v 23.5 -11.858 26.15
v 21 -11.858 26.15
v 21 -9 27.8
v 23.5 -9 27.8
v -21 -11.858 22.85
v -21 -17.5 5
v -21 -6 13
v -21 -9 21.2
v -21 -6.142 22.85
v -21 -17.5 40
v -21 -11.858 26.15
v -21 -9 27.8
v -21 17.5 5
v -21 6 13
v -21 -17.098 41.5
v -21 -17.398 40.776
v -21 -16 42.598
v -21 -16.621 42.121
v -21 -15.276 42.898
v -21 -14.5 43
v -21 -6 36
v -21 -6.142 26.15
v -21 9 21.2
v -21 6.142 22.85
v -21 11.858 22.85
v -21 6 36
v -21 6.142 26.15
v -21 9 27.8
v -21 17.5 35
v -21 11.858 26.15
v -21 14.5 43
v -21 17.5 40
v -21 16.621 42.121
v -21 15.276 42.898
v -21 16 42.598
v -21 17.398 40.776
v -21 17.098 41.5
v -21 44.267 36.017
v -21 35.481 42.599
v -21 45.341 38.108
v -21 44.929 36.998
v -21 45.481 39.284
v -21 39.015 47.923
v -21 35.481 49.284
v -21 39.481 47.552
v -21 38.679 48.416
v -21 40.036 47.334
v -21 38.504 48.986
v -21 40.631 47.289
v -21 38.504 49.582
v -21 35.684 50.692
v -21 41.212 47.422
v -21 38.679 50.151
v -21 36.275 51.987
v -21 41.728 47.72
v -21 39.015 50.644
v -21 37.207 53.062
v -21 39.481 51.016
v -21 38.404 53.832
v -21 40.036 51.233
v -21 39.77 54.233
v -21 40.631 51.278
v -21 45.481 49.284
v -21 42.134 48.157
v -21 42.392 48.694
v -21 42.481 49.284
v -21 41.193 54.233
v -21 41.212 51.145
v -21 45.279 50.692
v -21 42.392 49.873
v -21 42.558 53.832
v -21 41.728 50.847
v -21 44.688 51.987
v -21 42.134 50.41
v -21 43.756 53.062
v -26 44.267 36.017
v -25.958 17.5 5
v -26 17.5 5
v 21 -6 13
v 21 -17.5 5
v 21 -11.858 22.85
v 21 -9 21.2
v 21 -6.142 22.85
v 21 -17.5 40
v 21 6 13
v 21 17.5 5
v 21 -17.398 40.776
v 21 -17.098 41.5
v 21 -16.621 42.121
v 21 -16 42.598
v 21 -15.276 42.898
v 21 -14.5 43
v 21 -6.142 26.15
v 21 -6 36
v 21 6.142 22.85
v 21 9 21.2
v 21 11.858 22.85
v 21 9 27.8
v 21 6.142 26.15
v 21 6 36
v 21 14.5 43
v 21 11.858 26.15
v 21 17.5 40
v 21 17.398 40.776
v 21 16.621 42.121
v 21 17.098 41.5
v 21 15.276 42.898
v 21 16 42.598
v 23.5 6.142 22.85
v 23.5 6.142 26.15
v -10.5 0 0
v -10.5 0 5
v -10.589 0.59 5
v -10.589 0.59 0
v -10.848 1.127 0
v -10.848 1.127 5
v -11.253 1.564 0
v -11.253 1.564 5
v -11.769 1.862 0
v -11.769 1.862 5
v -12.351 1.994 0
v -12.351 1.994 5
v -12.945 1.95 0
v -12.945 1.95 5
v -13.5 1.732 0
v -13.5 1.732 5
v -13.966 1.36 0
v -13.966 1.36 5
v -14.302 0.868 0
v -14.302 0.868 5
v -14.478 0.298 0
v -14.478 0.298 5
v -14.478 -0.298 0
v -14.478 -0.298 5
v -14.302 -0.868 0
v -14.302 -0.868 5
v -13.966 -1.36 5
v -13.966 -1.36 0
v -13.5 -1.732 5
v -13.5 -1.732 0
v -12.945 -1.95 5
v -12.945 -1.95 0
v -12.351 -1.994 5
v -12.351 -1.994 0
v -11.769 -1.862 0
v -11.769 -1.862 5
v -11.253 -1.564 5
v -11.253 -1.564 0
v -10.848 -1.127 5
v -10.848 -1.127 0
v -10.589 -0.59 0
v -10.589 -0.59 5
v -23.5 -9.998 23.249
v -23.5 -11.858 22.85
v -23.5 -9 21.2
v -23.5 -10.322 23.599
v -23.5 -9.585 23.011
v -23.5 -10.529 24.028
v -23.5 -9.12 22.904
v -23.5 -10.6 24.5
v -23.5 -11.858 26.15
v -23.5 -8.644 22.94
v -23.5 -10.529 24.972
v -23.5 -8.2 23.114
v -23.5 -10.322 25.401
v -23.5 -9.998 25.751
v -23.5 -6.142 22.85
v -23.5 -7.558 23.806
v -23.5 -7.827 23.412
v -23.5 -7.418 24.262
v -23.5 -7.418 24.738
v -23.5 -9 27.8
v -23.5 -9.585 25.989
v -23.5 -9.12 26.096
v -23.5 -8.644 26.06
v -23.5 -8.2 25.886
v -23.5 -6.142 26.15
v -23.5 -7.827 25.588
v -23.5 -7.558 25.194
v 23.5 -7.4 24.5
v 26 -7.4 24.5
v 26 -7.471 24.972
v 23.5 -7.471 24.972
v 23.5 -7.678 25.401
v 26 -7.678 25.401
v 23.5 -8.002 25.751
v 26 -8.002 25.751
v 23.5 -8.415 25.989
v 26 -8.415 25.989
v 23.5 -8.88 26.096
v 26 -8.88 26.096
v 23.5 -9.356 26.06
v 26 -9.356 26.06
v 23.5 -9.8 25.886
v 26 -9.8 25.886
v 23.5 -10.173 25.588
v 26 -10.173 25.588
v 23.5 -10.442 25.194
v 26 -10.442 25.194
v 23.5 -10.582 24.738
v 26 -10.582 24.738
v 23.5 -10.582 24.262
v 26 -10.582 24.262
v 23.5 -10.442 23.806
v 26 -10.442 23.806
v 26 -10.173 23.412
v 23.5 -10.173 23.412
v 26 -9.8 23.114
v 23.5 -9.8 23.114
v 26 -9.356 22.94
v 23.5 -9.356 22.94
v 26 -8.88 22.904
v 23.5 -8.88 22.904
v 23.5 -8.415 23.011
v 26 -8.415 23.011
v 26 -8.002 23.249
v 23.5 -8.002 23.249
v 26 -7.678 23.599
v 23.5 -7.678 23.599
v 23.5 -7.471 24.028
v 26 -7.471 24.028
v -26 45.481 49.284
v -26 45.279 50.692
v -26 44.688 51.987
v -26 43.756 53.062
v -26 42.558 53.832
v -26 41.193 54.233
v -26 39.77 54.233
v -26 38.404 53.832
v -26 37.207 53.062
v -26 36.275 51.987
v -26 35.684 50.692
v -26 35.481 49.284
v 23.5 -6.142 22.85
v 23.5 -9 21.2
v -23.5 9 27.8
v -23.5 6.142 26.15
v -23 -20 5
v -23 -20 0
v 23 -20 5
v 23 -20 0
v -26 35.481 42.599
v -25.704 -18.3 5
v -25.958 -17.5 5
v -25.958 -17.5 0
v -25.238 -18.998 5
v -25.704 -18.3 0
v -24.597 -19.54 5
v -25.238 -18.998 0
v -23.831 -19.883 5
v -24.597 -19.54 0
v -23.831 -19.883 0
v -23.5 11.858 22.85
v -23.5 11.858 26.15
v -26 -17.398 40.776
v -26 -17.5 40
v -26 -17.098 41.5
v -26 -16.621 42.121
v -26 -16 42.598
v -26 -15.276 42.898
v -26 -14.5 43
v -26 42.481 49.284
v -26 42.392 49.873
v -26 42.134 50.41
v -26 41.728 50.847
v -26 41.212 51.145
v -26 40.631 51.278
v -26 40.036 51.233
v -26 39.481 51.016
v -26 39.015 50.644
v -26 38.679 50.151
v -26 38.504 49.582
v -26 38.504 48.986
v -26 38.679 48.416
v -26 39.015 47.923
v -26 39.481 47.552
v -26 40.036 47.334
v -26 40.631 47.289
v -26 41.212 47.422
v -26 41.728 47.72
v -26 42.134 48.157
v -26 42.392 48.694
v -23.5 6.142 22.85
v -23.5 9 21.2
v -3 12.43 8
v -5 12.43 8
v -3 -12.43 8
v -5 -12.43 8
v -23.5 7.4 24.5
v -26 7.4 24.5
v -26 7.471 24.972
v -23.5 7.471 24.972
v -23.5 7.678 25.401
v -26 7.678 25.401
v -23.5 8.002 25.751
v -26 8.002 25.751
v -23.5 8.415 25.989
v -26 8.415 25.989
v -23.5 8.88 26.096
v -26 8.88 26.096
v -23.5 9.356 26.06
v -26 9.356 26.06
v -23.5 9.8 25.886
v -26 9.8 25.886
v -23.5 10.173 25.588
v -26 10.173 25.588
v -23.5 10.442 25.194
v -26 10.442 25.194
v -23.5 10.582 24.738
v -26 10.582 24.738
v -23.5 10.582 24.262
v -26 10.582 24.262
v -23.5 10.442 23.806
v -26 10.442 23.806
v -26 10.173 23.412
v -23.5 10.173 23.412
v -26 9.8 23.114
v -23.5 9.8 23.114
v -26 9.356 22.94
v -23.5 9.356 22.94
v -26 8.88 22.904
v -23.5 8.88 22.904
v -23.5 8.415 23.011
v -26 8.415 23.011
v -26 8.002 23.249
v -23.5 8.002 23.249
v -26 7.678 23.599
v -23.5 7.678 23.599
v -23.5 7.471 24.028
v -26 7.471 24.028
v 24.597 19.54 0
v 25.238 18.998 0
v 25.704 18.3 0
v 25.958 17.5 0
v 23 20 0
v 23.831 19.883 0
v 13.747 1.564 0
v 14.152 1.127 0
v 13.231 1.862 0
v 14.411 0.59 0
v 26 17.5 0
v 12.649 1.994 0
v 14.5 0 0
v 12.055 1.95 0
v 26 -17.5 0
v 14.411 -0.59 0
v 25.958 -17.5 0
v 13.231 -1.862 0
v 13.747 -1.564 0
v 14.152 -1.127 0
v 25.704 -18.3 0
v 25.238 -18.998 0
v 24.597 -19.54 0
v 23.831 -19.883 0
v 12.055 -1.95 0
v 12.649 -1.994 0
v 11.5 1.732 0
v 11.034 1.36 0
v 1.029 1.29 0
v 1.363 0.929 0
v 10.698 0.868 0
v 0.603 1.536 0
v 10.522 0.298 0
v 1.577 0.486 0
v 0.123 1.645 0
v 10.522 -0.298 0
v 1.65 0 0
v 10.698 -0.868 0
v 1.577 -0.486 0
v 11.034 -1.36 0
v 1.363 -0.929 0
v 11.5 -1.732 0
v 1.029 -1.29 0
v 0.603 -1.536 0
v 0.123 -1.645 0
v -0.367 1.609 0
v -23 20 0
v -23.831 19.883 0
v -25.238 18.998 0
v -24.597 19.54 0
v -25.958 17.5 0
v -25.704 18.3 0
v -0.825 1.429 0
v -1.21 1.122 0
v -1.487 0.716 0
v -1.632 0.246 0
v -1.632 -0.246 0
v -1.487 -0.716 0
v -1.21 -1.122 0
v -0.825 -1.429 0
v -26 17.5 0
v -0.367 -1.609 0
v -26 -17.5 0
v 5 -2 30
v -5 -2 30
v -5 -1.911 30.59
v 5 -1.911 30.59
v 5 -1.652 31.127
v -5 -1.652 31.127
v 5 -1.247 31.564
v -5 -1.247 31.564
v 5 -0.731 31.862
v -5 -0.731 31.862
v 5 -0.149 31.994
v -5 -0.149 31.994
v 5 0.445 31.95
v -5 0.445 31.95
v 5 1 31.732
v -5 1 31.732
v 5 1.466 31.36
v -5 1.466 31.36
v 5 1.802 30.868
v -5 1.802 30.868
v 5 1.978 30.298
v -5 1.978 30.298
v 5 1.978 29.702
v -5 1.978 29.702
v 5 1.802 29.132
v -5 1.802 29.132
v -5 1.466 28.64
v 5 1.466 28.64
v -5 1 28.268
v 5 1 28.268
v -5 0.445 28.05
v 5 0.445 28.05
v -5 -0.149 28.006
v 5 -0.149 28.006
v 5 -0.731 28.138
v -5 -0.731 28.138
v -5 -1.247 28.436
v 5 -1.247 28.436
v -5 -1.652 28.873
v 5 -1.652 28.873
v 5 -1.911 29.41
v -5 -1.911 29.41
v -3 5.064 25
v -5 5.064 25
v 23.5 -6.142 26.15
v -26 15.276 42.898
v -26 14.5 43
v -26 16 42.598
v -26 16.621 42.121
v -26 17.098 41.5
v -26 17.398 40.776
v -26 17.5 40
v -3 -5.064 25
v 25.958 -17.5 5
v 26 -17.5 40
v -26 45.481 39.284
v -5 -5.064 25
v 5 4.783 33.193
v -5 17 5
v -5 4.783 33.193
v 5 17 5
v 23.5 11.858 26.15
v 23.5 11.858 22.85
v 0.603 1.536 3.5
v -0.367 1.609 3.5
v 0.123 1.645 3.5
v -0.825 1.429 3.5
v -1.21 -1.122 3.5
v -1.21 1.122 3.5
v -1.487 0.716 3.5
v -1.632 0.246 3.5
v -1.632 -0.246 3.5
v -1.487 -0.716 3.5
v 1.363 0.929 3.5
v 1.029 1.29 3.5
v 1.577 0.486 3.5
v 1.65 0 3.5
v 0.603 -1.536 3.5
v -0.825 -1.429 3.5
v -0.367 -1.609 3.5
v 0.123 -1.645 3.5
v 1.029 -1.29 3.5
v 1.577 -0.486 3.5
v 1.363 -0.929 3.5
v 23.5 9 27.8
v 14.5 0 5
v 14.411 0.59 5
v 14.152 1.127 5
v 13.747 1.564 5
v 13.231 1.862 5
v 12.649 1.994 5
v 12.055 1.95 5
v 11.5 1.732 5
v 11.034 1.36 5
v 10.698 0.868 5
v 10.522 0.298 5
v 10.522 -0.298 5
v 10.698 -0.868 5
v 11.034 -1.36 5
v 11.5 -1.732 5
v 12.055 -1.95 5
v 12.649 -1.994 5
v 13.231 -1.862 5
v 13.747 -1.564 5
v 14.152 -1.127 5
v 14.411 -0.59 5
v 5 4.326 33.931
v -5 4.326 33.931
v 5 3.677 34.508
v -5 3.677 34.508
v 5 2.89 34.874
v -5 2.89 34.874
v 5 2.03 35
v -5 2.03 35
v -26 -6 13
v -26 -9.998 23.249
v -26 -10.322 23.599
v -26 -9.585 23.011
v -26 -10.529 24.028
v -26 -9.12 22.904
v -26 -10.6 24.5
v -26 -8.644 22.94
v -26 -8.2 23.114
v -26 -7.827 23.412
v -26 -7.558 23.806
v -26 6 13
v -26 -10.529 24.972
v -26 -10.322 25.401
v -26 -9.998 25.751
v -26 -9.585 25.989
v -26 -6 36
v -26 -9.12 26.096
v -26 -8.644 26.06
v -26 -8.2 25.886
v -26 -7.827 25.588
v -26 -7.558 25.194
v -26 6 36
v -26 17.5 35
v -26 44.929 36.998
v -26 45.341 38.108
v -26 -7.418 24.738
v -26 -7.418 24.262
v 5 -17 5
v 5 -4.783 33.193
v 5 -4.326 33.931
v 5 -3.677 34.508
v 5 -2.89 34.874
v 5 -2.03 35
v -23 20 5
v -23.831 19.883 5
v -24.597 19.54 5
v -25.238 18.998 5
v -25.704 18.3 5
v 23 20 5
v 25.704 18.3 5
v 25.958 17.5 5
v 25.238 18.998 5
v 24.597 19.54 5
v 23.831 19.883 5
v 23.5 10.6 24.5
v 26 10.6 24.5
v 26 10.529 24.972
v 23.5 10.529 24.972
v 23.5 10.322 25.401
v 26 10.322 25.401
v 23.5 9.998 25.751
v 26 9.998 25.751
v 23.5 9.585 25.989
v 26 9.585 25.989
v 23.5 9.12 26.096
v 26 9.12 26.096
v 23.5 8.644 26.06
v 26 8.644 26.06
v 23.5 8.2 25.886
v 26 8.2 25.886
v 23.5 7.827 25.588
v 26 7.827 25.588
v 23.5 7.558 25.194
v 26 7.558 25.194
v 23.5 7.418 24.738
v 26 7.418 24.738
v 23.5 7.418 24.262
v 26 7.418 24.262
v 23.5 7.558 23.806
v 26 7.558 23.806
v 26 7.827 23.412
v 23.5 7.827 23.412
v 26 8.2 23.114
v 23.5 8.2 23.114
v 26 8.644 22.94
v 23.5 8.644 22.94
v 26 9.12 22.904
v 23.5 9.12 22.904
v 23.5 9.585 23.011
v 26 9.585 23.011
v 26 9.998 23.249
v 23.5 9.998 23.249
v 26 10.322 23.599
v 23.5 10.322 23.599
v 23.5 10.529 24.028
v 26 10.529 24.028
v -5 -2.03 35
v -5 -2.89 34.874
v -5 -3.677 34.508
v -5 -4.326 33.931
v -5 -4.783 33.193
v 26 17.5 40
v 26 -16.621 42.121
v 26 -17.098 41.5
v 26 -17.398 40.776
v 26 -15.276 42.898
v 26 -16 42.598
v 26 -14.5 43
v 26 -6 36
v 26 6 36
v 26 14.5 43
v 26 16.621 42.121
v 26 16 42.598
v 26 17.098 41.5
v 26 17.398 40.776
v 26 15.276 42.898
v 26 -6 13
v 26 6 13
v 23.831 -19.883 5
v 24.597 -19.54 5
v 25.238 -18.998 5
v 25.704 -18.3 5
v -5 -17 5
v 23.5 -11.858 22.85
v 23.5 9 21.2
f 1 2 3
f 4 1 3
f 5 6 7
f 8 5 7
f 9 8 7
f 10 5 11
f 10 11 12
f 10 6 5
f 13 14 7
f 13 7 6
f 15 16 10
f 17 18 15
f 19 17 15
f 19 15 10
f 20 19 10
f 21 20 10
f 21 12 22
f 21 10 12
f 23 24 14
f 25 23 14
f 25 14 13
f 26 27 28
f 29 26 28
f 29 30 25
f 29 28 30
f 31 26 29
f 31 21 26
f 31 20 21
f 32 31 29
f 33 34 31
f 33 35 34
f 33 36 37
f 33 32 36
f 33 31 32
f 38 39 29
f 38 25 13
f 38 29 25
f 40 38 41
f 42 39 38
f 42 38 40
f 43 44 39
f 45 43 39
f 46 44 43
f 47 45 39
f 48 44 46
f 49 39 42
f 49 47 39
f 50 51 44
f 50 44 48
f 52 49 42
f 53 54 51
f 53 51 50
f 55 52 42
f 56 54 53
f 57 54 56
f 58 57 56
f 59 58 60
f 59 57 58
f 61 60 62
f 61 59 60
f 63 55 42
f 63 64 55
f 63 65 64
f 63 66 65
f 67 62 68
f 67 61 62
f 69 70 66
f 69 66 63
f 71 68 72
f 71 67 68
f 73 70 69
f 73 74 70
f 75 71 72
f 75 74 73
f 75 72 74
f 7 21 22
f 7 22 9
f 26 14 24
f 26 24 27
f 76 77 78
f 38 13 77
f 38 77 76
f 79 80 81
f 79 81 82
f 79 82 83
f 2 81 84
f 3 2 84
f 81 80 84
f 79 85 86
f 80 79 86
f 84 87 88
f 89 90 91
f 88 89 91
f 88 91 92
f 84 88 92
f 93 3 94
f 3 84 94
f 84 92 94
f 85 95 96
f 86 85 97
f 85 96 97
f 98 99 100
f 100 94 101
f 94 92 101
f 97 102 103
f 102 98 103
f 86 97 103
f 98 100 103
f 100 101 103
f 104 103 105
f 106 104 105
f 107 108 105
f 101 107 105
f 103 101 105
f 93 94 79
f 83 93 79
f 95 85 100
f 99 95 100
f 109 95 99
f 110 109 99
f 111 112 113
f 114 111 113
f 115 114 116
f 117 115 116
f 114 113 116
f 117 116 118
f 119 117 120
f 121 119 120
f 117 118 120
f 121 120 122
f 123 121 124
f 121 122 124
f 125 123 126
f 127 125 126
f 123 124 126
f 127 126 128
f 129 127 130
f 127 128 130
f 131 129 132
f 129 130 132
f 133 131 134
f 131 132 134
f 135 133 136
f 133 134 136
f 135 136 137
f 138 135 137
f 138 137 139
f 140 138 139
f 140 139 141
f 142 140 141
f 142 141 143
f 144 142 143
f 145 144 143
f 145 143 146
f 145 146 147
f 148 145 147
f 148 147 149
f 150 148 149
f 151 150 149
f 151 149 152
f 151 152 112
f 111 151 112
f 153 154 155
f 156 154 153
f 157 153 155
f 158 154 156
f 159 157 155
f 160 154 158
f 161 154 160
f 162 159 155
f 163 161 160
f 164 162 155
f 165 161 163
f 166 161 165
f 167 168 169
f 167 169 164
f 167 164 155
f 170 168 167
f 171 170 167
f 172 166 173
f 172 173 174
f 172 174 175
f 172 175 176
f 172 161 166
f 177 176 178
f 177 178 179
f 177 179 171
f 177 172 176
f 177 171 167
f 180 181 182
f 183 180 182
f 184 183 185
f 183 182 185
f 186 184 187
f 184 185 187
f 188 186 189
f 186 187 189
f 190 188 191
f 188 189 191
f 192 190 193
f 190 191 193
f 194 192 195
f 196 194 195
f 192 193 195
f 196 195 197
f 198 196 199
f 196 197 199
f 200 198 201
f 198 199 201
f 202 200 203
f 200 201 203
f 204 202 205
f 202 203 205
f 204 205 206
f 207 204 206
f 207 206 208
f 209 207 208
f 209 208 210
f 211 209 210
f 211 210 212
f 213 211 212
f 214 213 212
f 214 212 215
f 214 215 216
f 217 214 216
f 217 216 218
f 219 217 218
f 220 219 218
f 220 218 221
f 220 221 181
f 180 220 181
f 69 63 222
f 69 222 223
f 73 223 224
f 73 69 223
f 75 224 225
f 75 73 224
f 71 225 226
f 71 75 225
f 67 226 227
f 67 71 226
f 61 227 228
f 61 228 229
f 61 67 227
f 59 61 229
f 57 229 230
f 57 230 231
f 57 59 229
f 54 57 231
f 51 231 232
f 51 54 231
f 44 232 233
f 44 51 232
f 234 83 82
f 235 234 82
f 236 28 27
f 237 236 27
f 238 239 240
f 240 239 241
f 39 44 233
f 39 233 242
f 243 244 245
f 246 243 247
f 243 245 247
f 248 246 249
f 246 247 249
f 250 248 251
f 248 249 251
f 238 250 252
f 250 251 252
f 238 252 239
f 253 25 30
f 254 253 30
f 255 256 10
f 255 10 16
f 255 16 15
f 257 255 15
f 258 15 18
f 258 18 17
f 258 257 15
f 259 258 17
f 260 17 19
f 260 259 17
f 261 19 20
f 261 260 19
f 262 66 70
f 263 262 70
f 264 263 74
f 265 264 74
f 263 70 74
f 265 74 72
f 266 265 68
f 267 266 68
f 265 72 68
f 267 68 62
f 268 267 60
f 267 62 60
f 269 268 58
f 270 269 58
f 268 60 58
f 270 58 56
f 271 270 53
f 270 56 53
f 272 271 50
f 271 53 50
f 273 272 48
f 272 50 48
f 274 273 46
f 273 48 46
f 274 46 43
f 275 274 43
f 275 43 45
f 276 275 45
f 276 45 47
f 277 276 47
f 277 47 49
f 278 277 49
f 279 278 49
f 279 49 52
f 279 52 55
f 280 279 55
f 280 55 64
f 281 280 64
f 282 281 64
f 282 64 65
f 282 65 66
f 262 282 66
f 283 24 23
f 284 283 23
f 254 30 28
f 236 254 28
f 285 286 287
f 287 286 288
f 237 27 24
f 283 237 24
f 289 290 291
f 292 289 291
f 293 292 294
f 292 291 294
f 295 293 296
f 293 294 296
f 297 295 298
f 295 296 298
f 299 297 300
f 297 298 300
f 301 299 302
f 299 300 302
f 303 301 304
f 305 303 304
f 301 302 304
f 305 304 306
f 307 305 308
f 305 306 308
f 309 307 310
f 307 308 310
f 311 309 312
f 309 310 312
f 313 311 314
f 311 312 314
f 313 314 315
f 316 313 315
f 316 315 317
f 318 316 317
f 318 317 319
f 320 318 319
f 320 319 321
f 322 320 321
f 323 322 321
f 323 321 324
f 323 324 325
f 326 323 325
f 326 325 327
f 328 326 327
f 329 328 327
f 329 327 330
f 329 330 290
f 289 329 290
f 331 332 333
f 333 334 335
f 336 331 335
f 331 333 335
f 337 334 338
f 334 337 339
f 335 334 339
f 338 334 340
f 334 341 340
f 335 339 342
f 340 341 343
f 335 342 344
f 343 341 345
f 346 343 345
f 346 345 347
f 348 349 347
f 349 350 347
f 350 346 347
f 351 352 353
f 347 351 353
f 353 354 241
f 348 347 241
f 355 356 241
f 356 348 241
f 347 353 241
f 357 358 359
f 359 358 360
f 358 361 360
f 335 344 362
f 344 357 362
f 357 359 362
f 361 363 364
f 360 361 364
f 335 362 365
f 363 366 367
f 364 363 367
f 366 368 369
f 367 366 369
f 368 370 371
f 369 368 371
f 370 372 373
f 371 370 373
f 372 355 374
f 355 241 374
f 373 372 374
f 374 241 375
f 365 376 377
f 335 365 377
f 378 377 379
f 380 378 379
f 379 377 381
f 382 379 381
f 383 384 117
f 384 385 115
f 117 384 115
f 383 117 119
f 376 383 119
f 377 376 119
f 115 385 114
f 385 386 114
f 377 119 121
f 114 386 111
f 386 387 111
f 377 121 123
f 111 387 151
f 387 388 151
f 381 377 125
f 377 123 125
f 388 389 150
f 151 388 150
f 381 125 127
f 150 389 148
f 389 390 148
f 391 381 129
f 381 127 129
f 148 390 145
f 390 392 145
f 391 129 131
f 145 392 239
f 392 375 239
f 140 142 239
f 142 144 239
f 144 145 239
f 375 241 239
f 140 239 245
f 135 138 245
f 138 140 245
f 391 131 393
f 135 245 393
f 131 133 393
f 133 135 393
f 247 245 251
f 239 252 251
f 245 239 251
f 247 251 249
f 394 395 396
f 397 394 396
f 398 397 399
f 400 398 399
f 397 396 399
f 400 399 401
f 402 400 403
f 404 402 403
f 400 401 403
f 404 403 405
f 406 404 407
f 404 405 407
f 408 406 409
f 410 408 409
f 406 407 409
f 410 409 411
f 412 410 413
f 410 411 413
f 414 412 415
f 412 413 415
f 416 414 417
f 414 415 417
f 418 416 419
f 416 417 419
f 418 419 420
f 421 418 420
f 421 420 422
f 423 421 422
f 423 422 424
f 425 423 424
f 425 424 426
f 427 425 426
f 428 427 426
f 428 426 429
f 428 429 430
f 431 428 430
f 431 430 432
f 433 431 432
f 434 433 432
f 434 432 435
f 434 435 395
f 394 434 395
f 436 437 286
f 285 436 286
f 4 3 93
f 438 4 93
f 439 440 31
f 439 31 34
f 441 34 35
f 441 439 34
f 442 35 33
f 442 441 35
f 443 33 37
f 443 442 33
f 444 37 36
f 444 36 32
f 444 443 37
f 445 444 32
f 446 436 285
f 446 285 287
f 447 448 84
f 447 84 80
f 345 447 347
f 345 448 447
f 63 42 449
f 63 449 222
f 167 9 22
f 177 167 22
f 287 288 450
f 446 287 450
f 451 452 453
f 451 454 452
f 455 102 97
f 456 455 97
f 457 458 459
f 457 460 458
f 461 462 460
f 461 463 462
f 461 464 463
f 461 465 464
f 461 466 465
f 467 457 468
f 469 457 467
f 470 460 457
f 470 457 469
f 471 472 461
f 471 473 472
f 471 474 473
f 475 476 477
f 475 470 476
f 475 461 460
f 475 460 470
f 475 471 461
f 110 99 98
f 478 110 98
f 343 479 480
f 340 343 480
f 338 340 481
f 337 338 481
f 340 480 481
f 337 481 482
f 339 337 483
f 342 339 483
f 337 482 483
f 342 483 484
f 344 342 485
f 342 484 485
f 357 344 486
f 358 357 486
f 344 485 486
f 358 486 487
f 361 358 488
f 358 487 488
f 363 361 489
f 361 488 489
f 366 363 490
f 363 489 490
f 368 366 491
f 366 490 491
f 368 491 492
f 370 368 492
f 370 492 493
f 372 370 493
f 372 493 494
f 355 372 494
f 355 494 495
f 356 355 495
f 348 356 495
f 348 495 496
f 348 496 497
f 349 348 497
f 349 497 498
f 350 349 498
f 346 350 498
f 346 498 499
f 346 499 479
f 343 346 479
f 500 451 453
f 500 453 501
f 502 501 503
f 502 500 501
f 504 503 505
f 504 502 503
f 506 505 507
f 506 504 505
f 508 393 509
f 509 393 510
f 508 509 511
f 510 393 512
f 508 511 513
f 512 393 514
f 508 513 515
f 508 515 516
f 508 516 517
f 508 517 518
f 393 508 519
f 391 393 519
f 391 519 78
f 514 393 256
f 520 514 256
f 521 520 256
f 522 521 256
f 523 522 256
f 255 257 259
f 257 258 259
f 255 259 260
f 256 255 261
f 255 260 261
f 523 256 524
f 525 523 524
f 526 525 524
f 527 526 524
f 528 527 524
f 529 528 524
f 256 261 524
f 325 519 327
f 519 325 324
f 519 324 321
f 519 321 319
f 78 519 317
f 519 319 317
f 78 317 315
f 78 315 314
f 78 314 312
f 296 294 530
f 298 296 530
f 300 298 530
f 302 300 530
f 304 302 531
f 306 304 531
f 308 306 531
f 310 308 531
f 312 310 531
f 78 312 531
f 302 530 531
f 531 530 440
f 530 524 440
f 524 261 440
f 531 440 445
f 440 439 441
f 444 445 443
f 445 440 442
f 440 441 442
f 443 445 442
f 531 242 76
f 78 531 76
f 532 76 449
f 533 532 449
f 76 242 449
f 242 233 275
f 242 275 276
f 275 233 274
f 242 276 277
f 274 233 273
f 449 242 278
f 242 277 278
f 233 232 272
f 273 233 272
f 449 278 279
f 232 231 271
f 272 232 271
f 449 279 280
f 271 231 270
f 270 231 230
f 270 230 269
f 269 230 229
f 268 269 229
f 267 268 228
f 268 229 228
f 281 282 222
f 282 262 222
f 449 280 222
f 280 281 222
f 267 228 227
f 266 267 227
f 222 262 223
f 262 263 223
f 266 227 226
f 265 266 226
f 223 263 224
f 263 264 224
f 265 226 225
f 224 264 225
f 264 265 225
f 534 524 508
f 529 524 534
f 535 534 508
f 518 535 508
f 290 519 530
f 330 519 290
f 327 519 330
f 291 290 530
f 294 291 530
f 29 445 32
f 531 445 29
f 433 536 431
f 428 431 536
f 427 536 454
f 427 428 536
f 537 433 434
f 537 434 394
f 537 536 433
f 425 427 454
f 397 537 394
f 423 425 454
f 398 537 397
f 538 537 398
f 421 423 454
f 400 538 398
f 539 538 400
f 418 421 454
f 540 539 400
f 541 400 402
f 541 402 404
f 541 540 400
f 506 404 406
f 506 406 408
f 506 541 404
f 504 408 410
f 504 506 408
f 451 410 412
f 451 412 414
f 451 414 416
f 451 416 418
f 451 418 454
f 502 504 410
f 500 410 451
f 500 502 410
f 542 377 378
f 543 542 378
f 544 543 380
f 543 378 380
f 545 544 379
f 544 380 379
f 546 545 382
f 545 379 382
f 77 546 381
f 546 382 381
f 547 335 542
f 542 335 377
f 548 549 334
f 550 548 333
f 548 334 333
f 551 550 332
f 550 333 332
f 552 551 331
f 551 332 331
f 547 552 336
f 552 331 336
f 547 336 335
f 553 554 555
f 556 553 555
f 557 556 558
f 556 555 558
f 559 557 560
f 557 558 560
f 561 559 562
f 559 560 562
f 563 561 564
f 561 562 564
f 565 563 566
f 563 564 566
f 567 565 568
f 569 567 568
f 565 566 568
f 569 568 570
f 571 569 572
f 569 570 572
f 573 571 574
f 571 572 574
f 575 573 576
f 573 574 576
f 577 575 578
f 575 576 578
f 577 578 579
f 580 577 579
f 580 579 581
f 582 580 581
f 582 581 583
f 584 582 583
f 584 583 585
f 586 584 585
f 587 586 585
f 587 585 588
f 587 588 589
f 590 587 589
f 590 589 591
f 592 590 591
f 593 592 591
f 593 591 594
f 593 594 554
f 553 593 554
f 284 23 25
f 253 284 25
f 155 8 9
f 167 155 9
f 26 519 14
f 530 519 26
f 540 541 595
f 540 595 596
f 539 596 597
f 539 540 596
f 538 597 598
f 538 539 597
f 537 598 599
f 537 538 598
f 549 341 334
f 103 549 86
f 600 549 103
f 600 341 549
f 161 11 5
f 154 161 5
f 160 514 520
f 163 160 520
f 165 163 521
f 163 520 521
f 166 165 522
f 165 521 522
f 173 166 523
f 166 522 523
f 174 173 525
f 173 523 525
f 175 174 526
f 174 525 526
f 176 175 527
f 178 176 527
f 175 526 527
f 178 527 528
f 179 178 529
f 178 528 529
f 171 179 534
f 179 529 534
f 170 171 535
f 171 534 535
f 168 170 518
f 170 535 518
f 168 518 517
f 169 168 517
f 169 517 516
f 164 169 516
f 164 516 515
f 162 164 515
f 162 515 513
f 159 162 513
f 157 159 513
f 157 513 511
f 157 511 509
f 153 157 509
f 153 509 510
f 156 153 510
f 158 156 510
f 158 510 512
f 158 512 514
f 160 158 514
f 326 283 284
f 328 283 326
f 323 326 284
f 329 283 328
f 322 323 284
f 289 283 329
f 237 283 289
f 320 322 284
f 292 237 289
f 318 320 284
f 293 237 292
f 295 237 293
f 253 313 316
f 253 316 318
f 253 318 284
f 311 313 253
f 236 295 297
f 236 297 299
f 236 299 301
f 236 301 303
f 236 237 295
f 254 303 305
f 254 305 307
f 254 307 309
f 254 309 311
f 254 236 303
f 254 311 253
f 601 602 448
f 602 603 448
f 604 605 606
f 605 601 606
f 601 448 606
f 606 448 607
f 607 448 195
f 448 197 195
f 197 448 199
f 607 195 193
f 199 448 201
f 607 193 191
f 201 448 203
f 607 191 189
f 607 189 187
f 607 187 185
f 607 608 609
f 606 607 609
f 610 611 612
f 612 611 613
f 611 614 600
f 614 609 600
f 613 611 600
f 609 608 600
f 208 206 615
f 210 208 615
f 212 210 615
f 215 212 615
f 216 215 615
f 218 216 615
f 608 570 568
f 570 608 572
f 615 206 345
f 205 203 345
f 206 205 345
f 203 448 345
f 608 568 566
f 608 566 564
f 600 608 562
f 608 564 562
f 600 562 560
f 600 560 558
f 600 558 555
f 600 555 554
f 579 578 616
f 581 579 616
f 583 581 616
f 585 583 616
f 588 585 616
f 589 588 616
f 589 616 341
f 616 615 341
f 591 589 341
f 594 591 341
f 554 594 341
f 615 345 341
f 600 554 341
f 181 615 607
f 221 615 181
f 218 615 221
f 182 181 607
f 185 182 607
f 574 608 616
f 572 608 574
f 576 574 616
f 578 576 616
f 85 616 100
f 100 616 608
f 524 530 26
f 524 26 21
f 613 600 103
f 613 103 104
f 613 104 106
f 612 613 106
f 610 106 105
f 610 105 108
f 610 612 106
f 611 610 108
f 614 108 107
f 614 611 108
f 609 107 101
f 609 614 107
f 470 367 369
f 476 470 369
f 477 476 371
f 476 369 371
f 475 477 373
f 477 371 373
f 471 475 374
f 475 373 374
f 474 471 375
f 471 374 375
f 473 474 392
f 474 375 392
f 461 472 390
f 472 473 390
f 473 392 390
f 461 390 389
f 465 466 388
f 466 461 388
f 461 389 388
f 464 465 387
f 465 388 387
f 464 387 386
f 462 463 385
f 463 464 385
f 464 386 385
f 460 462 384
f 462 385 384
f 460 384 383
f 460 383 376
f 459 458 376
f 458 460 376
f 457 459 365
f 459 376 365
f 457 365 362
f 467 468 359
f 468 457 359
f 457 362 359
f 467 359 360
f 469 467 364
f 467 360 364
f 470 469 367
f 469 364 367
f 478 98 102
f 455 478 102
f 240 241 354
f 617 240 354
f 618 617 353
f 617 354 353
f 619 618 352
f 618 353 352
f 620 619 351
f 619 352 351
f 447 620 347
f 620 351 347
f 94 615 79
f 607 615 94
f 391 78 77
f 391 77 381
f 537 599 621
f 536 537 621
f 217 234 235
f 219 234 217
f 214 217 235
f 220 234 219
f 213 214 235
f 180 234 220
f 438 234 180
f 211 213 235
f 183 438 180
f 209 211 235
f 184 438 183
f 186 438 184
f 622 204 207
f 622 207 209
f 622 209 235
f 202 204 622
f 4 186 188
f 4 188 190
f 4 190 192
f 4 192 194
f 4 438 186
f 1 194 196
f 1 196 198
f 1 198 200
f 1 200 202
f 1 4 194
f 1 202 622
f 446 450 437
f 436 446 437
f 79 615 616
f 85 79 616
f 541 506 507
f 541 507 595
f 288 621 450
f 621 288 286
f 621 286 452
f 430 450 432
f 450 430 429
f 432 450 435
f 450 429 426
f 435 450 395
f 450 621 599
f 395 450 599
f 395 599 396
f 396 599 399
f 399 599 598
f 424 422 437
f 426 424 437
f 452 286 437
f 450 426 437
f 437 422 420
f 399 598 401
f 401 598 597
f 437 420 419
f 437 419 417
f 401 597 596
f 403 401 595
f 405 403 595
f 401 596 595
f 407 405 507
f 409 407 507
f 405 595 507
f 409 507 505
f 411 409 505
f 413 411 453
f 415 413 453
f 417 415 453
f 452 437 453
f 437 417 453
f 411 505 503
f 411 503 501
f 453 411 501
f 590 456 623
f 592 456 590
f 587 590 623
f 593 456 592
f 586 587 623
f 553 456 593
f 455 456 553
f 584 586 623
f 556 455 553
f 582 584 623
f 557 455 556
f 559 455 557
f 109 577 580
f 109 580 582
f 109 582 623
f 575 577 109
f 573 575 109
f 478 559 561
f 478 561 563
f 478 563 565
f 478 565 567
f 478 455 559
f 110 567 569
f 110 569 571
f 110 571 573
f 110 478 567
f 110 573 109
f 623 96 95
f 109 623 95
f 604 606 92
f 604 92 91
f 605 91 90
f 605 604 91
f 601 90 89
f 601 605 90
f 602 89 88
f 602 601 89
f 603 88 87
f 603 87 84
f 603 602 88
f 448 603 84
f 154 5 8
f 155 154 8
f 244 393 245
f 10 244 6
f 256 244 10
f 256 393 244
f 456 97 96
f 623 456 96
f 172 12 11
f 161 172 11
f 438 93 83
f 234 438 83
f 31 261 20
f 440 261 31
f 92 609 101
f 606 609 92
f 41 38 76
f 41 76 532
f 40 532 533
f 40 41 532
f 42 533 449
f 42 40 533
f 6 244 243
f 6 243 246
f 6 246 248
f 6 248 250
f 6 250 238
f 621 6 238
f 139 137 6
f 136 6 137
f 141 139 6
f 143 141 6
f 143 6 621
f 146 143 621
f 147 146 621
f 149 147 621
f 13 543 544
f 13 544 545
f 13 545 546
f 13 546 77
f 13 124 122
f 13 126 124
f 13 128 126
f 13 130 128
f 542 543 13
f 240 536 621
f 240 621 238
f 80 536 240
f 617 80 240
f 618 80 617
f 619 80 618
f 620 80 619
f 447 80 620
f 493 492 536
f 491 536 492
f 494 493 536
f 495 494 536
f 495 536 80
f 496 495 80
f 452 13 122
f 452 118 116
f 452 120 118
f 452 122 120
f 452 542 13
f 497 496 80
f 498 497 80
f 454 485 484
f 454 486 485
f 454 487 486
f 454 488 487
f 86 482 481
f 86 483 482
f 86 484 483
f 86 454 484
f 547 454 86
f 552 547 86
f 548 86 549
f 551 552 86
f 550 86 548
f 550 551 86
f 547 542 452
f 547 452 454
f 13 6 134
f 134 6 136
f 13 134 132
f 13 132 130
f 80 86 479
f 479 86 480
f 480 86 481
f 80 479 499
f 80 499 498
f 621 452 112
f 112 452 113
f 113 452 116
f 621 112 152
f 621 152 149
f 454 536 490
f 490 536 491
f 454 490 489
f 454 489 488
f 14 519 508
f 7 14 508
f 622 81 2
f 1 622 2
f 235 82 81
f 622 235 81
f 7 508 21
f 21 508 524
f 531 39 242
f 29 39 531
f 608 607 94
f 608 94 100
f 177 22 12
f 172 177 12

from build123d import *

# Parameters (mm, degrees)
F1_DEPTH      = 5
F2_R          = 1.65
F3_DEPTH      = 3.5
F5_DEPTH      = 5
F5_DEPTH_BACK = 5
F6_R          = 1.6
F6_W          = 12
F6_H          = 23
F7_DEPTH      = 5
F9_DEPTH      = 2.5
F13_ANGLE     = 180
F14_R         = 2
F15_DEPTH     = 25
F17_DEPTH     = 5
F18_R         = 2
F19_DEPTH     = 5.001
F20_R         = 2
F21_DEPTH     = 5.001
F23_DEPTH     = 2


with BuildPart() as f1:
    # F0 (on Top) → F1 (new body)
    with BuildSketch(Plane.XY):
        with BuildLine():
            Line((23, 20), (-23, 20))
            ThreePointArc((-23, 20), (-25.1213203436, 19.1213203436), (-26, 17))
            Line((-26, 17), (-26, -17))
            ThreePointArc((-26, -17), (-25.1213203436, -19.1213203436), (-23, -20))
            Line((-23, -20), (23, -20))
            ThreePointArc((23, -20), (25.1213203436, -19.1213203436), (26, -17))
            Line((26, -17), (26, 17))
            ThreePointArc((26, 17), (25.1213203436, 19.1213203436), (23, 20))
        make_face()
    extrude(amount=F1_DEPTH)

    # F2 (on face) → F3 (cut)
    with BuildSketch(Plane(origin=(0, 0, 0), x_dir=(1, 0, 0), z_dir=(0, 0, -1))):
        Circle(F2_R)
    extrude(amount=-F3_DEPTH, mode=Mode.SUBTRACT)

    # F4 (on Right) → F5 (join, two sides)
    with BuildSketch(Plane.YZ) as f5_sk:
        with BuildLine():
            Line((0, 5), (17, 5))
            Line((17, 5), (4.7831103311, 33.1928223129))
            ThreePointArc((4.7831103311, 33.1928223129), (3.6768840191, 34.5078344182), (2.0304434551, 35))
            Line((2.0304434551, 35), (0, 35))
            Line((0, 35), (0, 5))
        make_face()
        with BuildLine():
            Line((-17, 5), (0, 5))
            Line((0, 5), (0, 35))
            Line((0, 35), (-2.0304434551, 35))
            ThreePointArc((-2.0304434551, 35), (-3.6768840191, 34.5078344182), (-4.7831103311, 33.1928223129))
            Line((-4.7831103311, 33.1928223129), (-17, 5))
        make_face()
    extrude(amount=F5_DEPTH)
    extrude(f5_sk.sketch, amount=-F5_DEPTH_BACK)

    # F6 (on face) → F7 (join)
    with BuildSketch(Plane.YZ.offset(26)):
        with BuildLine():
            Line((17, 0), (17.5, 0))
            Line((17.5, 0), (17.5, 40))
            ThreePointArc((17.5, 40), (16.6213203436, 42.1213203436), (14.5, 43))
            Line((14.5, 43), (-14.5, 43))
            ThreePointArc((-14.5, 43), (-16.6213203436, 42.1213203436), (-17.5, 40))
            Line((-17.5, 40), (-17.5, 0))
            Line((-17.5, 0), (-17, 0))
            Line((-17, 0), (-17, 5))
            Line((-17, 5), (17, 5))
            Line((17, 5), (17, 0))
        make_face()
        with Locations((-9, 24.5)):
            Circle(F6_R, mode=Mode.SUBTRACT)
        with Locations((0, 24.5)):
            Rectangle(F6_W, F6_H, mode=Mode.SUBTRACT)
        with Locations((9, 24.5)):
            Circle(F6_R, mode=Mode.SUBTRACT)
    extrude(amount=-F7_DEPTH)

    # F8 (on face) → F9 (cut)
    with BuildSketch(Plane(origin=(21, 0, 0), x_dir=(0, -1, 0), z_dir=(-1, 0, 0))):
        Polygon((11.8578838325, 26.15), (9, 27.8), (6.1421161675, 26.15), (6.1421161675, 22.85), (9, 21.2), (11.8578838325, 22.85), align=None)
        Polygon((-11.8578838325, 22.85), (-9, 21.2), (-6.1421161675, 22.85), (-6.1421161675, 26.15), (-9, 27.8), (-11.8578838325, 26.15), align=None)
    extrude(amount=-F9_DEPTH, mode=Mode.SUBTRACT)


with BuildPart() as f10_1:
    # F10: copy of F1
    add(f1.part.moved(Location((-47, 0, 0))))


with BuildPart() as f10_1_1:
    # F13: moved
    add(f10_1.part.rotate(Axis((-23.5, 0, 21.4526057243), (0, 0, 1)), F13_ANGLE))


with BuildPart() as f15_tool:
    # F14 (on face) → F15 (new body)
    with BuildSketch(Plane(origin=(-5, 0, 0), x_dir=(0, -1, 0), z_dir=(-1, 0, 0))):
        with Locations((0, 30)):
            Circle(F14_R)
    extrude(amount=-F15_DEPTH)


with BuildPart() as f1_1:
    add(f1.part)

    # F15: cut by f15_tool
    add(f15_tool.part, mode=Mode.SUBTRACT)



with BuildPart() as f10_1_2:
    add(f10_1_1.part)

    # F15: cut by f15_tool
    add(f15_tool.part, mode=Mode.SUBTRACT)


with BuildPart() as f1_2:
    add(f1_1.part)

    add(f10_1_2.part)  # F17 merges F10_1
    # F16 (on face) → F17 (join)
    with BuildSketch(Plane.YZ.offset(-21)):
        with BuildLine():
            Line((17.5, 35), (17.5, 5))
            Line((17.5, 5), (44.2666971773, 36.0169755285))
            ThreePointArc((44.2666971773, 36.0169755285), (45.1678468921, 37.5410467887), (45.4813332936, 39.2836282906))
            Line((45.4813332936, 39.2836282906), (45.4813332936, 49.2836282906))
            ThreePointArc((45.4813332936, 49.2836282906), (40.4813332936, 54.2836282906), (35.4813332936, 49.2836282906))
            Line((35.4813332936, 49.2836282906), (35.4813332936, 42.5987942024))
            Line((35.4813332936, 42.5987942024), (17.5, 35))
        make_face()
    extrude(amount=-F17_DEPTH)

    # F18 (on face) → F19 (cut, through all)
    with BuildSketch(Plane.YZ.offset(-21)):
        with Locations((40.4813332936, 49.2836282906)):
            Circle(F18_R)
    extrude(amount=-F19_DEPTH, mode=Mode.SUBTRACT)

    # F20 (on face) → F21 (cut, through all)
    with BuildSketch(Plane.XY.offset(5)):
        with Locations((-12.5, 0)):
            Circle(F20_R)
        with Locations((12.5, 0)):
            Circle(F20_R)
    extrude(amount=-F21_DEPTH, mode=Mode.SUBTRACT)

    # F22 (on face) → F23 (cut)
    with BuildSketch(Plane(origin=(-5, 0, 0), x_dir=(0, -1, 0), z_dir=(-1, 0, 0))):
        Polygon((-5.0637767885, 25), (-12.4304434551, 8), (12.4304434551, 8), (5.0637767885, 25), align=None)
    extrude(amount=-F23_DEPTH, mode=Mode.SUBTRACT)


solid = f1_2.part
